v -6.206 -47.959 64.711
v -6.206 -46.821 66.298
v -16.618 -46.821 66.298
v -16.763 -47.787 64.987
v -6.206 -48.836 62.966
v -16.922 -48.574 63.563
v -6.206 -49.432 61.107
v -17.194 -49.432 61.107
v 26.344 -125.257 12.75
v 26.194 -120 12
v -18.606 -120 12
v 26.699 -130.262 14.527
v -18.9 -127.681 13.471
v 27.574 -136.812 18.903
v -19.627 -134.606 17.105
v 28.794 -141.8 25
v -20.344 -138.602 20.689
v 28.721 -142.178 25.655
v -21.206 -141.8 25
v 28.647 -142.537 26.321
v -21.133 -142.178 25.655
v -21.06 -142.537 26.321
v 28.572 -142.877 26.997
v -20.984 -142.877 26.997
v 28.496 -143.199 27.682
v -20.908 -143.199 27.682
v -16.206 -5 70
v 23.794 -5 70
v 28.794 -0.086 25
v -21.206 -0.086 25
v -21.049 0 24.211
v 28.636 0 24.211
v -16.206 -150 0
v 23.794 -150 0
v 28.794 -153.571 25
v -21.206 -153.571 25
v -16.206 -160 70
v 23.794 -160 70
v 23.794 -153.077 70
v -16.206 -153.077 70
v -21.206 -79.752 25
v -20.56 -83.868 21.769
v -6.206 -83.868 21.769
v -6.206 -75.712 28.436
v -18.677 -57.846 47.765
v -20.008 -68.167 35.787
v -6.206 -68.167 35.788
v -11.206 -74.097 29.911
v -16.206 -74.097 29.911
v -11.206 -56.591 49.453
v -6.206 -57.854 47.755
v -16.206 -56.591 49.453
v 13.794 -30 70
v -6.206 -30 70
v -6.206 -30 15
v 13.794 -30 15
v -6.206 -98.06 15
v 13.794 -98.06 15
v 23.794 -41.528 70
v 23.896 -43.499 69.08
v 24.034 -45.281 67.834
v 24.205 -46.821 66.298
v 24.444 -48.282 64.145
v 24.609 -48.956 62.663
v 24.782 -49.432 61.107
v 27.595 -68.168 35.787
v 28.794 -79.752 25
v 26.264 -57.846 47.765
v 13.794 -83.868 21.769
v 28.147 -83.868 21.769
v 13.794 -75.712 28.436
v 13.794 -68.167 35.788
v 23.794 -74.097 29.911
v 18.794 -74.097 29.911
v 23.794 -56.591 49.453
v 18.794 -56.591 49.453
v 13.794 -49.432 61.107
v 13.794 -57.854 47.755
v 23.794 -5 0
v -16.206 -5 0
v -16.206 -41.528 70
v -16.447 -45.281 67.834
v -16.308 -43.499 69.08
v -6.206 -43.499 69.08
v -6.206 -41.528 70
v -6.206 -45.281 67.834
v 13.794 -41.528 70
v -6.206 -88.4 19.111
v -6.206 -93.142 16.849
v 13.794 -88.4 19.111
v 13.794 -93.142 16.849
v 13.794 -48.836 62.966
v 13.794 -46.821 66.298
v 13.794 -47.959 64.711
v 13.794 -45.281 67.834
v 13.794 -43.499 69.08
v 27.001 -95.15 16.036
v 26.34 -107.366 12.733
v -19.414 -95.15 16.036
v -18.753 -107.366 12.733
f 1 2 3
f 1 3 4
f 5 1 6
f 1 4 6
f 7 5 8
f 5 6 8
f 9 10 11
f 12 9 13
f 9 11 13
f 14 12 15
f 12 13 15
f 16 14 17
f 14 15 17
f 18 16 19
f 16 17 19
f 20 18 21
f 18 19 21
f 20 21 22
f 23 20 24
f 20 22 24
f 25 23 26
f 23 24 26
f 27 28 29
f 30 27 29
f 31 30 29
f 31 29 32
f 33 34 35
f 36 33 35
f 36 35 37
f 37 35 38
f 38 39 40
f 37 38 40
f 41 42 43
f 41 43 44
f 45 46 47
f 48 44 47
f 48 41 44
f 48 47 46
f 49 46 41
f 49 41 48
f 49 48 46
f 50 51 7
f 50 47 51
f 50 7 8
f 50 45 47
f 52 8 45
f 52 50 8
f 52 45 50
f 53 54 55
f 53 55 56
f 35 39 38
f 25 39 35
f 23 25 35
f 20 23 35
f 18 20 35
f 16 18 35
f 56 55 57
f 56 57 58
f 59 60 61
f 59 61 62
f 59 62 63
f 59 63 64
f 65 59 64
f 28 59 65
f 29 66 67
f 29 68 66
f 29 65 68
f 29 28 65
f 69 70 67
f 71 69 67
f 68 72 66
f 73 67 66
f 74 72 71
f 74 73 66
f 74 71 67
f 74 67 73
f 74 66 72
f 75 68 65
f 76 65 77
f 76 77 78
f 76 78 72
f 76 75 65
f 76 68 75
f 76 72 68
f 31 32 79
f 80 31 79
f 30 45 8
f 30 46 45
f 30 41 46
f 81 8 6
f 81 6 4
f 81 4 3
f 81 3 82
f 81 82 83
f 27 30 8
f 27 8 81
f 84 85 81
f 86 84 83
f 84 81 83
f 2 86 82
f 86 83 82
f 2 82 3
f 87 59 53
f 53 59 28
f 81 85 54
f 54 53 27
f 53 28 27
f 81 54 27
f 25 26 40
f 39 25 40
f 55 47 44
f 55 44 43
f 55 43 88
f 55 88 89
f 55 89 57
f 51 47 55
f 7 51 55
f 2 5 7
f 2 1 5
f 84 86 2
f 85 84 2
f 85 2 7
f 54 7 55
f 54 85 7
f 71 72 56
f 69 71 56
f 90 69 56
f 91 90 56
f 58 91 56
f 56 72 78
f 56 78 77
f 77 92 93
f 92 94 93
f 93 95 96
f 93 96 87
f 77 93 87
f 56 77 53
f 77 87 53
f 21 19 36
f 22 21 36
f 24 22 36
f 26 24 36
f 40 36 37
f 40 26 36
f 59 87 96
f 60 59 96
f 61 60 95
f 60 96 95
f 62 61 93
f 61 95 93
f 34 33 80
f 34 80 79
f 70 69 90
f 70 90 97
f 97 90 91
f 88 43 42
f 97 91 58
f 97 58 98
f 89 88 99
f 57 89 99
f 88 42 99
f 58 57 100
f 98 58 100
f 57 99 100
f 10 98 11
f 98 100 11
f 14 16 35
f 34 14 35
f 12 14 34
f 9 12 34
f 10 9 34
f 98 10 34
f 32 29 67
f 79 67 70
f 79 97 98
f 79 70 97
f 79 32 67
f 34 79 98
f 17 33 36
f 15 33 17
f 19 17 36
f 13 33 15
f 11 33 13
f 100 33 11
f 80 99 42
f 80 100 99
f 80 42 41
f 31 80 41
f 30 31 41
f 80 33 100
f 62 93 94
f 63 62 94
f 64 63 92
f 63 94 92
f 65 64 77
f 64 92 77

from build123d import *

# Parameters (mm, degrees)
F1_DEPTH = 160
F3_W     = 20
F3_H     = 75
F4_DEPTH = 55
F6_DEPTH = 80
F7_DEPTH = 80
F8_DEPTH = 200


with BuildPart() as f1:
    # F0 (on Front) → F1 (new body)
    with BuildSketch(Plane.XZ):
        Polygon((-21.2063081563, 25), (-16.2063081563, 70), (-21.2063081563, 70), align=None)
        Polygon((23.7936918437, 70), (-16.2063081563, 70), (-21.2063081563, 25), (-16.2063081563, 0), (23.7936918437, 0), (28.7936918437, 25), align=None)
        Polygon((28.7936918437, 70), (23.7936918437, 70), (28.7936918437, 25), align=None)
        Polygon((28.7936918437, 0), (28.7936918437, 25), (23.7936918437, 0), align=None)
        Polygon((-16.2063081563, 0), (-21.2063081563, 25), (-21.2063081563, 0), align=None)
    extrude(amount=F1_DEPTH)

    # F3 (on face) → F4 (cut)
    with BuildSketch(Plane.XY.offset(70)):
        with Locations((3.7936918437, -67.5)):
            Rectangle(F3_W, F3_H)
    extrude(amount=-F4_DEPTH, mode=Mode.SUBTRACT)

    # F5 (on face) → F6 (cut)
    with BuildSketch(Plane(origin=(-21.2063081563, 0, 0), x_dir=(0, -1, 0), z_dir=(-1, 0, 0))):
        with BuildLine():
            Line((120, 37), (120, 12))
            ThreePointArc((120, 12), (133.8212996215, 16.5538504991), (143.1985488392, 27.6818815335))
            Line((143.1985488392, 27.6818815335), (145.3737177065, 37))
            Line((145.3737177065, 37), (120, 37))
        make_face()
        with BuildLine():
            ThreePointArc((83.8675871491, 21.7687748373), (101.1727846043, 14.0695932653), (120, 12))
            Line((120, 12), (120, 37))
            Line((120, 37), (145.3737177065, 37))
            Line((145.3737177065, 37), (153.0770510435, 70))
            Line((153.0770510435, 70), (41.5276810527, 70))
            ThreePointArc((41.5276810527, 70), (44.4171997001, 68.4957364145), (46.8214808068, 66.2976555906))
            ThreePointArc((46.8214808068, 66.2976555906), (48.4316228068, 63.8555180083), (49.431870901, 61.1066824401))
            add(Edge.make_bspline(
                [(83.8675871491, 21.7687748373), (80.8791033045, 24.0777342993), (73.578379889, 29.6970945717), (57.4311562796, 47.0286131058), (51.4057960432, 57.3415797194), (49.431870901, 61.1066824401)],
                knots=[0, 0, 0, 0, 0.2722123221, 0.663175389, 0.8936579619, 0.8936579619, 0.8936579619, 0.8936579619], degree=3))
        make_face()
    extrude(amount=-F6_DEPTH, mode=Mode.SUBTRACT)

    # F2 (on face) → F7 (cut)
    with BuildSketch(Plane.YZ.offset(28.7936918437)):
        Polygon((-160, 0), (-150, 0), (-160, 70), (-160, 24.2114625871), align=None)
        Polygon((-5, 70), (0, 24.2114625871), (0, 70), align=None)
        Polygon((-5, 0), (0, 0), (0, 24.2114625871), align=None)
    extrude(amount=-F7_DEPTH, mode=Mode.SUBTRACT)

    # F0 (on Front) → F8 (cut)
    with BuildSketch(Plane.XZ):
        Polygon((28.7936918437, 70), (23.7936918437, 70), (28.7936918437, 25), align=None)
        Polygon((-21.2063081563, 25), (-16.2063081563, 70), (-21.2063081563, 70), align=None)
        Polygon((28.7936918437, 0), (28.7936918437, 25), (23.7936918437, 0), align=None)
        Polygon((-16.2063081563, 0), (-21.2063081563, 25), (-21.2063081563, 0), align=None)
    extrude(amount=F8_DEPTH, mode=Mode.SUBTRACT)


solid = f1.part
